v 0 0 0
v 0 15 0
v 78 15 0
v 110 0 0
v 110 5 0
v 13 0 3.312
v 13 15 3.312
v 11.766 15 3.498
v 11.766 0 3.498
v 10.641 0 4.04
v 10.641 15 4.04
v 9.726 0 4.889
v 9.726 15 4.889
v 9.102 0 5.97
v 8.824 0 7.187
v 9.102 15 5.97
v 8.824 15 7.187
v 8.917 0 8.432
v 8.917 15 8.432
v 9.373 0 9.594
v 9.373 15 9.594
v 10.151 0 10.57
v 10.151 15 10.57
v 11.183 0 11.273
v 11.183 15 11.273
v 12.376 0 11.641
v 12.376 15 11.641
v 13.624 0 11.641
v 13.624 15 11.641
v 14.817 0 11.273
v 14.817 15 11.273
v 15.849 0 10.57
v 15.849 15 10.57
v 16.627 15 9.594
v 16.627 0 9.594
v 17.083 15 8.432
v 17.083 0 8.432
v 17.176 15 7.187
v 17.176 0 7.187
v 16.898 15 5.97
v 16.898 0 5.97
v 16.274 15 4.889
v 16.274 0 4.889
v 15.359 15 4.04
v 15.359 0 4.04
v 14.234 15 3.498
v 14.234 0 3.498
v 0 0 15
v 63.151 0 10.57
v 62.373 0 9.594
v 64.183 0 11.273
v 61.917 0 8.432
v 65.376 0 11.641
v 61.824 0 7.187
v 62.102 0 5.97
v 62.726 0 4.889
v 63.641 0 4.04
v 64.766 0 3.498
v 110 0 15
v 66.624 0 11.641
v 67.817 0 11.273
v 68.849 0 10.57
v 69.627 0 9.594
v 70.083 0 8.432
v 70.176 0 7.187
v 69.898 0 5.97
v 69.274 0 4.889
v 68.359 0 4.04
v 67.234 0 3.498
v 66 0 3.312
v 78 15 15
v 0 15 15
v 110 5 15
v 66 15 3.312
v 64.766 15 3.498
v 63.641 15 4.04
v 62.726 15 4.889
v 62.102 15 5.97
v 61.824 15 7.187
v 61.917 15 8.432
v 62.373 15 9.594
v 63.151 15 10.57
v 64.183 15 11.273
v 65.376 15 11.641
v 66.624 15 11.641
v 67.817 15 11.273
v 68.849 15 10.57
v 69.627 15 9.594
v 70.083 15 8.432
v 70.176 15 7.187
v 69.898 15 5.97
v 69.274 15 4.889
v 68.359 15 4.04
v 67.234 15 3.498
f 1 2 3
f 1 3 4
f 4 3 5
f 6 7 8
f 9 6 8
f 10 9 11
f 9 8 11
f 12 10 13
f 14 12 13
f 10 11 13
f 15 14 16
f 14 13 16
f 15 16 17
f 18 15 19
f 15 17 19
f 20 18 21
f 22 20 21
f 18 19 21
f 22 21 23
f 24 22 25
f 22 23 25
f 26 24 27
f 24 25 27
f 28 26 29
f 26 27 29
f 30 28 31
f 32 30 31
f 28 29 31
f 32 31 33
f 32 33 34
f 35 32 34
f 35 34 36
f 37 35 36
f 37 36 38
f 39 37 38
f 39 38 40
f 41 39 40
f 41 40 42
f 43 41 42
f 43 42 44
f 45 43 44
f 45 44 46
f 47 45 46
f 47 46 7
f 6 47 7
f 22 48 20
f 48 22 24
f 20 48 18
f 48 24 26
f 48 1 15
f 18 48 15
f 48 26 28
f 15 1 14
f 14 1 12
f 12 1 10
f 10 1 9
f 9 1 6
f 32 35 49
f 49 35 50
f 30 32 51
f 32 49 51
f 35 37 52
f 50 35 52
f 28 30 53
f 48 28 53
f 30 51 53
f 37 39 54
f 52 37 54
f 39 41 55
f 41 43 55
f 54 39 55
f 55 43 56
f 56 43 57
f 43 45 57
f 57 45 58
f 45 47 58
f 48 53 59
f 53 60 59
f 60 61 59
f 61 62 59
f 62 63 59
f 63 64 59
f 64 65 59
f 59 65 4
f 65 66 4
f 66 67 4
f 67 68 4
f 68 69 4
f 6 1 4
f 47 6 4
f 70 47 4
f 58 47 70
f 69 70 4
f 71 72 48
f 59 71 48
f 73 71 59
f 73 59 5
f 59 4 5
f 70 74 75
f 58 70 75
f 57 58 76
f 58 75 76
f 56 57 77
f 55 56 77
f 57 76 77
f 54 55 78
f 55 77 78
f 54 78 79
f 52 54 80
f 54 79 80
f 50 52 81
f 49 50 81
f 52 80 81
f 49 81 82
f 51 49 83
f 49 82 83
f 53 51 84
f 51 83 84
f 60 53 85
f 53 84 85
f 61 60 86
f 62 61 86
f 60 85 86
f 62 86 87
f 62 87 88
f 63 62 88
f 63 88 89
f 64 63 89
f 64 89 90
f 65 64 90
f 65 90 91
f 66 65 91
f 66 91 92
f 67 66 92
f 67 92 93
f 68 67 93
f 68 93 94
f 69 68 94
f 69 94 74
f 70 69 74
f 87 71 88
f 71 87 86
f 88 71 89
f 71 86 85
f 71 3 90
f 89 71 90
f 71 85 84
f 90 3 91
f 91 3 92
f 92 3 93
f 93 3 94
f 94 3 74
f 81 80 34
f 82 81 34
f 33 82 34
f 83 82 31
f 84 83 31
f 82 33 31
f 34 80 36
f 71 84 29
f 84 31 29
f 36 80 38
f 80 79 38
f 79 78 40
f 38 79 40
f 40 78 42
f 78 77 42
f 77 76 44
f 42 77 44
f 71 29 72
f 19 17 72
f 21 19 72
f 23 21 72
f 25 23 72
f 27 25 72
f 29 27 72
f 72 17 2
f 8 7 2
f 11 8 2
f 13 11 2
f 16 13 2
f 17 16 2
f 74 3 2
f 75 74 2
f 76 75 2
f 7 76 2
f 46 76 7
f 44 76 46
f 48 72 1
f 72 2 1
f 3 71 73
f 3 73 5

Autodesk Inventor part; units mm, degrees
ref_plane "YZ Plane" through (0, 0, 0) normal (1, 0, 0) x (0, 1, 0)
ref_plane "XZ Plane" through (0, 0, 0) normal (0, 1, 0) x (-1, 0, 0)
ref_plane "XY Plane" through (0, 0, 0) normal (0, 0, 1) x (1, 0, 0)
sketch "Esboço1" plane through (0, 0, 0) normal (0, 0, 1) x (1, 0, 0)
  line L0 (0, 0) -> (110, 0)
  line L1 (110, 0) -> (110, 15)
  line L2 (110, 15) -> (0, 15)
  line L3 (0, 15) -> (0, 0)
  dimension "d0" = 110
  dimension "d1" = 15
extrude "Extrusão1" add sketch "Esboço1" along normal blind 15
chamfer "Chanfro1" distance 10 distance2 32 1 edges at (110, 15, 7.5) measured on face at (110, 5, 5)
sketch "Esboço2" plane through (0, 0, 0) normal (0, -1, 0) x (1, 0, 0)
  line L0 (0, 15) -> (110, 15) projected
  line L1 (0, 0) -> (0, 15) projected
  point P0 (13, 7.5)
  point P1 (66, 7.5)
  dimension "d7" = 7.5
  dimension "d8" = 13
  dimension "d25" = 53
hole "Furo1" at (13, 0, 7.5) at (66, 0, 7.5) direction (0, 1, 0) diameter 8.376 end through all thread size "M10x1.5" class "6H" standard "ISO Metric profile"
properties part number "Garra2"
